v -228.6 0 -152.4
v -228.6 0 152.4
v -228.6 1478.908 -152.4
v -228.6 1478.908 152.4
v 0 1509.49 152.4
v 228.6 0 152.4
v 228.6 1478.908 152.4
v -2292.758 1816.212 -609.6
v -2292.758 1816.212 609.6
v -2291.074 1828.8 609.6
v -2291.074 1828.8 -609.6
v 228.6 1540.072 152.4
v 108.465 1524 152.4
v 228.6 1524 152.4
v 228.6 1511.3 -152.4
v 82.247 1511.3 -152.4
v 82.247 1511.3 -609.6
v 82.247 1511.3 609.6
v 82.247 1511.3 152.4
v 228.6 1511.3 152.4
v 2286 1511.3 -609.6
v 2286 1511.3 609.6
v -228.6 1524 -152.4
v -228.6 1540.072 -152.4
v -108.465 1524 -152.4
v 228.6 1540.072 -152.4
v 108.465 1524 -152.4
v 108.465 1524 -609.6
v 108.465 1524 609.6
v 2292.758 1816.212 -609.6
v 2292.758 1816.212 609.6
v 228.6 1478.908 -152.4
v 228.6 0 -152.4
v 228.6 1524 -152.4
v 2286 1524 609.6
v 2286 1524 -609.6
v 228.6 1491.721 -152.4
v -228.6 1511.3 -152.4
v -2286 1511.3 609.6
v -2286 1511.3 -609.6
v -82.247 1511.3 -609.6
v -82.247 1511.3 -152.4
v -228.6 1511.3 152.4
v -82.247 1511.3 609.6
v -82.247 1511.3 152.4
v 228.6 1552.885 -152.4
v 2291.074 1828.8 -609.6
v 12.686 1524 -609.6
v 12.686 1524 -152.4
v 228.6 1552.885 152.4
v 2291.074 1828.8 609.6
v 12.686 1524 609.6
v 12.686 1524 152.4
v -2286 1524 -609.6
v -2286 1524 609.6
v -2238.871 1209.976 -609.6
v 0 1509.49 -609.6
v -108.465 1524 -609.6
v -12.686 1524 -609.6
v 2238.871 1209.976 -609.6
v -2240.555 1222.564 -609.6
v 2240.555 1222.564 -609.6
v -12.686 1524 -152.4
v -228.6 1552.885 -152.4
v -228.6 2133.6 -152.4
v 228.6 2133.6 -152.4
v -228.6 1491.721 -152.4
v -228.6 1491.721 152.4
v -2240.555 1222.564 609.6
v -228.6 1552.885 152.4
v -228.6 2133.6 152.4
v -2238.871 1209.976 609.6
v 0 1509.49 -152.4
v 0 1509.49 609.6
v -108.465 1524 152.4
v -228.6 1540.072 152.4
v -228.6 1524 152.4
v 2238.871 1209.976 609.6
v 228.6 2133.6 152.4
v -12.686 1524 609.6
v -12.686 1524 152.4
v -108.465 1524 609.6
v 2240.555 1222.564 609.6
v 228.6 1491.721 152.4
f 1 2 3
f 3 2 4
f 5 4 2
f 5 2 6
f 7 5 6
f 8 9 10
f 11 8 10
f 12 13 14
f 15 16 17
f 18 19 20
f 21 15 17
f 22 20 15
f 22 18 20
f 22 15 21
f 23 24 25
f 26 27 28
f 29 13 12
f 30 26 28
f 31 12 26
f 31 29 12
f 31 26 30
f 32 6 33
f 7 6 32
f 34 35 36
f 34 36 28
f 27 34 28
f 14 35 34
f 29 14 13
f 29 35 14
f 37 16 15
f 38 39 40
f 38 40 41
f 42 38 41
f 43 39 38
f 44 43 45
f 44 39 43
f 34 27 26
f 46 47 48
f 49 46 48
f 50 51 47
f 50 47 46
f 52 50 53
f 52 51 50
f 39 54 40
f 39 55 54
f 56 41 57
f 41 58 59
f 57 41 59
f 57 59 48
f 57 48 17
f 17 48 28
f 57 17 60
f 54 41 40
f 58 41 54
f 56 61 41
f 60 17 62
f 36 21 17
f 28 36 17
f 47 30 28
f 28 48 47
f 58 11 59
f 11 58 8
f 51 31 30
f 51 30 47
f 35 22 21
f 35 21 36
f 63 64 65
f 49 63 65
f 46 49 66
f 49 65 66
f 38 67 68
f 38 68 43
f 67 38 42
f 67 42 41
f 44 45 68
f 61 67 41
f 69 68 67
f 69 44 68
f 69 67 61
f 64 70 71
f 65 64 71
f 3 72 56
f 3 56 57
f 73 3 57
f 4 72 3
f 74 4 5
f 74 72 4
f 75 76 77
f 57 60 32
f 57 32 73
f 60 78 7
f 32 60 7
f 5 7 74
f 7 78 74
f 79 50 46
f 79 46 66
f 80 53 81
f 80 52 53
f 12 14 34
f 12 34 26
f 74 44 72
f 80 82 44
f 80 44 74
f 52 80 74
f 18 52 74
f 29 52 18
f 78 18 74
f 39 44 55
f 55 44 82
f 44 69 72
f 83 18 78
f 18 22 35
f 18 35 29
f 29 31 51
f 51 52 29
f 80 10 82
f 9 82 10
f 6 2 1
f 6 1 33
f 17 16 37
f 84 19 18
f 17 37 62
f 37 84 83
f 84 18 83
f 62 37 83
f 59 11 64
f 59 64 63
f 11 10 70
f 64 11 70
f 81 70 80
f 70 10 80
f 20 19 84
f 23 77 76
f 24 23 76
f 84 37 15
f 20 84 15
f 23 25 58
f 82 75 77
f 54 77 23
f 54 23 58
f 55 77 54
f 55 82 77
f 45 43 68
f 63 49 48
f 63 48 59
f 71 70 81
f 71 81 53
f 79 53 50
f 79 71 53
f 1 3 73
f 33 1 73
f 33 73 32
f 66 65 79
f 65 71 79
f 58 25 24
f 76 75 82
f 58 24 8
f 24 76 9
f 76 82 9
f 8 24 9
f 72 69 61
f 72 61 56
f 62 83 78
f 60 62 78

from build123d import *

# Parameters (mm, degrees)
SKETCH1_W           = 457.2
SKETCH1_H           = 2133.6
BOSS_EXTRUDE1_DEPTH = 152.4
BOSS_EXTRUDE2_DEPTH = 609.6


with BuildPart() as part:
    # Sketch1 → Boss-Extrude1 (new, symmetric)
    with BuildSketch(Plane.XY):
        with Locations((0, 1066.8)):
            Rectangle(SKETCH1_W, SKETCH1_H)
    extrude(amount=BOSS_EXTRUDE1_DEPTH, both=True)

    # Sketch2 → Boss-Extrude2 (add, symmetric)
    with BuildSketch(Plane.XY):
        Polygon((12.68592016, 1524), (-2286, 1524), (-2286, 1511.3), (-82.246931836, 1511.3), align=None)
        Polygon((13.531648171, 1511.3), (-82.246931836, 1511.3), (-2240.554721608, 1222.564242527), (-2238.870733393, 1209.976383945), align=None)
        Polygon((108.464500167, 1524), (12.68592016, 1524), (-82.246931836, 1511.3), (13.531648171, 1511.3), align=None)
        Polygon((2291.074368064, 1828.8), (12.68592016, 1524), (108.464500167, 1524), (2292.758356279, 1816.212141418), align=None)
        Polygon((2286, 1524), (108.464500167, 1524), (13.531648171, 1511.3), (2286, 1511.3), align=None)
    boss_extrude2 = extrude(amount=BOSS_EXTRUDE2_DEPTH, both=True)

    # Mirror1: Boss-Extrude2 across plane
    add(boss_extrude2.mirror(Plane(origin=(0, 0, 0), x_dir=(0, 0, 1), z_dir=(1, 0, 0))))


solid = part.part
